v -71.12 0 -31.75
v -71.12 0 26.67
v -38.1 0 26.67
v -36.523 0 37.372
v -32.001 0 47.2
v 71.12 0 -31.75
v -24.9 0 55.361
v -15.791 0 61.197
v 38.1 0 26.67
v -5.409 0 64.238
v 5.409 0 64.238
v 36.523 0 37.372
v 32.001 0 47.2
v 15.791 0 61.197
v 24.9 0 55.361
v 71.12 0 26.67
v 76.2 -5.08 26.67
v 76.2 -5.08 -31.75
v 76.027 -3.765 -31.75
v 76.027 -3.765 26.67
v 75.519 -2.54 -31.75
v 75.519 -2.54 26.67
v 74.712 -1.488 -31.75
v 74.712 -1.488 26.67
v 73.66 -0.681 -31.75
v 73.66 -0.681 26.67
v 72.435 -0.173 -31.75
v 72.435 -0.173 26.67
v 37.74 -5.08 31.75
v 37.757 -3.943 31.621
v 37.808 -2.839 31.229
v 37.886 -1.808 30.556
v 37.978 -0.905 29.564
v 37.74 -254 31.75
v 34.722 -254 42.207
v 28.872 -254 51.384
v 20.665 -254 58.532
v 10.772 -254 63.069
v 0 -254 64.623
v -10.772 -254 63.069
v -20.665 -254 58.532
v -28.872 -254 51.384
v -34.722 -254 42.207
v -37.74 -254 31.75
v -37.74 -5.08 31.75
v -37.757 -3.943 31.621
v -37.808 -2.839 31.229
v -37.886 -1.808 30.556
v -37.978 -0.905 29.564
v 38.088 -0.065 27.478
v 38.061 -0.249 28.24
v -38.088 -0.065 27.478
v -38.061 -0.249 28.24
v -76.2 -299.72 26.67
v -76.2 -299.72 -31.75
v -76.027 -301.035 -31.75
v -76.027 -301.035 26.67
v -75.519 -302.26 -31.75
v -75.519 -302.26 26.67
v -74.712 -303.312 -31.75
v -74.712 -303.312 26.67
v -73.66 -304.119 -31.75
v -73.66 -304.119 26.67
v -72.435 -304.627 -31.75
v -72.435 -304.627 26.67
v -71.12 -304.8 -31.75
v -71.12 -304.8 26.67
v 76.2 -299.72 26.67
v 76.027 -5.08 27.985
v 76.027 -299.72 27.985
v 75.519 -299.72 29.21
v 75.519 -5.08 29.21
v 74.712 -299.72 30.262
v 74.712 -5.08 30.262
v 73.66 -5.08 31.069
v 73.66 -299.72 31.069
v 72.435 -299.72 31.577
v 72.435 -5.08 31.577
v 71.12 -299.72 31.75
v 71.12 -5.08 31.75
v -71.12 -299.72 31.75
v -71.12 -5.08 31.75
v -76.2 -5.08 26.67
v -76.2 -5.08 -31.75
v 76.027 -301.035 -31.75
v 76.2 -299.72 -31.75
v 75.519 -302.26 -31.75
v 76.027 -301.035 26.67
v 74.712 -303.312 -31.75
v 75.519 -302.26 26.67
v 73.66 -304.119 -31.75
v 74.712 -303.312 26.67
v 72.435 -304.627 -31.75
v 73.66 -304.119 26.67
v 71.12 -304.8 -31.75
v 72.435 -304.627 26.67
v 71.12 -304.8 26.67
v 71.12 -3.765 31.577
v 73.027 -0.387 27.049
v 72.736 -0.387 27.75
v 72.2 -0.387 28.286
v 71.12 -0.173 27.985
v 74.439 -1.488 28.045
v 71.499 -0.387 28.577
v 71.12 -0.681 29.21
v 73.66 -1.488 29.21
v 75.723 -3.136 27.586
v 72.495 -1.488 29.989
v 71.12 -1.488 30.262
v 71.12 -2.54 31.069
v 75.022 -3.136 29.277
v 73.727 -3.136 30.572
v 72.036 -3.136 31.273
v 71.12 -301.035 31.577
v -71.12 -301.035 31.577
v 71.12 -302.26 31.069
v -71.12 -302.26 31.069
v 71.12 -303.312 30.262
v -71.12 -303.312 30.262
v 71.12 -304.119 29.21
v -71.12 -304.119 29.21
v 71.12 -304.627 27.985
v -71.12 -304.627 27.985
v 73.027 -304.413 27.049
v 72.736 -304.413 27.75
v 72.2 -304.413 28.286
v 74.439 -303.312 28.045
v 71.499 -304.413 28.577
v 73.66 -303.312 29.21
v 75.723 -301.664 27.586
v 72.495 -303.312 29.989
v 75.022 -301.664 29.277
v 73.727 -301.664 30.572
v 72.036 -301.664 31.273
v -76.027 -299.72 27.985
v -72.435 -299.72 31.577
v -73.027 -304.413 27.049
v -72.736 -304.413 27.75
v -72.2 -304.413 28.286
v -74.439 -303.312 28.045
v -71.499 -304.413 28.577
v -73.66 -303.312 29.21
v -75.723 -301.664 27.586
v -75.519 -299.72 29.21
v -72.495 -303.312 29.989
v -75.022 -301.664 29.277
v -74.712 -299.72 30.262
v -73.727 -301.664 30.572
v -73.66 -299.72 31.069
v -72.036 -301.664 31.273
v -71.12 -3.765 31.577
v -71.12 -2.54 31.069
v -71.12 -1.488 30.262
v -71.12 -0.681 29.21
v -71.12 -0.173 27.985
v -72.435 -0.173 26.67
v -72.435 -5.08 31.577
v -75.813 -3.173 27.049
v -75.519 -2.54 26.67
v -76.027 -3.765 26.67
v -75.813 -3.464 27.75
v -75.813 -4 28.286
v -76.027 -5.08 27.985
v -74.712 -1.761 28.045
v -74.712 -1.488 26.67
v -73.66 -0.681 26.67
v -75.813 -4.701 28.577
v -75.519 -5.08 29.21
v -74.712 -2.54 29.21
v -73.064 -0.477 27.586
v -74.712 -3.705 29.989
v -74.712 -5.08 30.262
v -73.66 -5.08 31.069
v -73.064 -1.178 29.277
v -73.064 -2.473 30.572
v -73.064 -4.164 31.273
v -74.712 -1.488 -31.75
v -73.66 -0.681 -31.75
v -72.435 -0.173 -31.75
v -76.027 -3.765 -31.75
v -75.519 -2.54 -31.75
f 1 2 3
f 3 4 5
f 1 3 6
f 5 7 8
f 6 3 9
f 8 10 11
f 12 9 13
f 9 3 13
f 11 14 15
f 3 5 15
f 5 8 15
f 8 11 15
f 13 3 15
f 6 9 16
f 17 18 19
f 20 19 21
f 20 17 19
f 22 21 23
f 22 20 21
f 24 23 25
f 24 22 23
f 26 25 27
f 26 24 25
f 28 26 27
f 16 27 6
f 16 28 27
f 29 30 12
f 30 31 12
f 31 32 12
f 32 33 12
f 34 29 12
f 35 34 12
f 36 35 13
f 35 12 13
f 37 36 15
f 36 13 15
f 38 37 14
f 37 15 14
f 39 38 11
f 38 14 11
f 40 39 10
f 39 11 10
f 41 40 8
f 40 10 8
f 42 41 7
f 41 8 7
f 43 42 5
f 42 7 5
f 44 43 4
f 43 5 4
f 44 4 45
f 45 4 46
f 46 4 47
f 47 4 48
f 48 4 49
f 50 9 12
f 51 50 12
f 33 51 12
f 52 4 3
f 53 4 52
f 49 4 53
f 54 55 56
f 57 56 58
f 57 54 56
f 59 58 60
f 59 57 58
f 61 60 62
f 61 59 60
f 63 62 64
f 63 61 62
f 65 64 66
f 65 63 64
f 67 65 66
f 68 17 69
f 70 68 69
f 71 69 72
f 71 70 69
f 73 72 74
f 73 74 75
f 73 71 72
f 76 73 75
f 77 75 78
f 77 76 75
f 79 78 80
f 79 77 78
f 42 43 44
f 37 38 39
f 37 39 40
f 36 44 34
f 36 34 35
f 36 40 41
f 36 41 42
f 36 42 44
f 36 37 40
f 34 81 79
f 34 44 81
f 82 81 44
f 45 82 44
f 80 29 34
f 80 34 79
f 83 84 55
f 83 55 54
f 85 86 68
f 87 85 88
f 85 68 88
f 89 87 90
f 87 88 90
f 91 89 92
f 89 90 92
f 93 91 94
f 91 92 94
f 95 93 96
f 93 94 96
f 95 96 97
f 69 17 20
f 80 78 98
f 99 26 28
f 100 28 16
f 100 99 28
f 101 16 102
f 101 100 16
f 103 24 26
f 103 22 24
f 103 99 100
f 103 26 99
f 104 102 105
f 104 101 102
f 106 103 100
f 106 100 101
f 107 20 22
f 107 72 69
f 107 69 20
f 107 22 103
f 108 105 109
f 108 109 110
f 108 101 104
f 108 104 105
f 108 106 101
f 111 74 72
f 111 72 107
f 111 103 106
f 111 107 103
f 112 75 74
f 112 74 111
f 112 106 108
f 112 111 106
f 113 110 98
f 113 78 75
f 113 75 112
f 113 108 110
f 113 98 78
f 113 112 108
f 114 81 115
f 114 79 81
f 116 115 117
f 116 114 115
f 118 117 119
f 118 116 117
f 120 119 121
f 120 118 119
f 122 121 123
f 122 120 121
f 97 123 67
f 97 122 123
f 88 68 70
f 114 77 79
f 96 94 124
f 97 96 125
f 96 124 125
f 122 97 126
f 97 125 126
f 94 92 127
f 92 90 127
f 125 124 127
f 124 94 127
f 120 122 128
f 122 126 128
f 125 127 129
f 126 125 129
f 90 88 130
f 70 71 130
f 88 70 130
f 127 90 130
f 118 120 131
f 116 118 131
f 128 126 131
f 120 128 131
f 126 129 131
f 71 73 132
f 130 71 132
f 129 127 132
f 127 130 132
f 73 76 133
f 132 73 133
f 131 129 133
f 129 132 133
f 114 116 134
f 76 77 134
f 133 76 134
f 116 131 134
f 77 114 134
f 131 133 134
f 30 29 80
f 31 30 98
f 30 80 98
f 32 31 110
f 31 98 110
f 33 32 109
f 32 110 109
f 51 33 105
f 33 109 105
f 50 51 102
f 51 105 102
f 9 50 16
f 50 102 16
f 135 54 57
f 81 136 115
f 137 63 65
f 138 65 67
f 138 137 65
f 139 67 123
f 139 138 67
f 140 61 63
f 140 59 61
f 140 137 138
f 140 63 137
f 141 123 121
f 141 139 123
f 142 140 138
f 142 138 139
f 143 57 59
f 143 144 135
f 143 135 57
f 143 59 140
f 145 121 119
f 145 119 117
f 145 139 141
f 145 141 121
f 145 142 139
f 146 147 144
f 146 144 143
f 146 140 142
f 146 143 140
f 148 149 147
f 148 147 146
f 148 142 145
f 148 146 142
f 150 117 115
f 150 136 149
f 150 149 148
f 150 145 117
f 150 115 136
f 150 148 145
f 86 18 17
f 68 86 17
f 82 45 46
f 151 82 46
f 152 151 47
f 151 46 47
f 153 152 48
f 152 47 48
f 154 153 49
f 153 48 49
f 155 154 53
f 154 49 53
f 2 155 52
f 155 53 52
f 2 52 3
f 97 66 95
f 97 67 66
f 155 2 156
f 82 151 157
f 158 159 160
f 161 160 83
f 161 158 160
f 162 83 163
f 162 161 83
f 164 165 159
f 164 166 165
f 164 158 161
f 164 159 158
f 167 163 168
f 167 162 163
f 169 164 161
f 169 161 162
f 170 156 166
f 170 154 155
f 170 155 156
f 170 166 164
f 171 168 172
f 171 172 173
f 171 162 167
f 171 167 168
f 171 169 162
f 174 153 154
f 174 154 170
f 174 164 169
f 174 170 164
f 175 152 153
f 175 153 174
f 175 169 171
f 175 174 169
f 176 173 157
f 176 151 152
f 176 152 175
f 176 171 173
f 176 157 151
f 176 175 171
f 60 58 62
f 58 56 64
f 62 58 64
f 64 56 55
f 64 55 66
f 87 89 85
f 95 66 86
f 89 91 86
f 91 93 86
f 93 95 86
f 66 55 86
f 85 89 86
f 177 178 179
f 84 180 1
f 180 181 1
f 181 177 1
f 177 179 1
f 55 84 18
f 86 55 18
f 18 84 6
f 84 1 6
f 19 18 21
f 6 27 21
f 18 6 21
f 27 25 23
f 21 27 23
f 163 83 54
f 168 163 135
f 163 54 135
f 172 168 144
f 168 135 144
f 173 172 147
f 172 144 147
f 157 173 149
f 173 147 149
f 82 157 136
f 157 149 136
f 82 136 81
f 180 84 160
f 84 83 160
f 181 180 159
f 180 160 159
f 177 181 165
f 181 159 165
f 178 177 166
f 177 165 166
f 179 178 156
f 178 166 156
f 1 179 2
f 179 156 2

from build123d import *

# Parameters (mm, degrees)
F0_W     = 152.4
F0_H     = 63.5
F1_DEPTH = 304.8
F2_R     = 5.08
F3_R     = 38.1
F4_DEPTH = 254


with BuildPart() as f1:
    # F0 (on Front) → F1 (new body)
    with BuildSketch(Plane.XZ):
        Rectangle(F0_W, F0_H)
    extrude(amount=F1_DEPTH)

    # F2
    f2_edges = [f1.edges().sort_by_distance(p)[0] for p in [
        (76.2, -152.4, 31.75),
        (76.2, -304.8, 0),
        (76.2, 0, 0),
        (0, 0, 31.75),
        (-76.2, 0, 0),
        (-76.2, -152.4, 31.75),
        (-76.2, -304.8, 0),
        (0, -304.8, 31.75),
    ]]
    fillet(f2_edges, radius=F2_R)

    # F3 (on Front) → F4 (join)
    with BuildSketch(Plane.XZ):
        with Locations((0, 26.523461)):
            Circle(F3_R)
    extrude(amount=F4_DEPTH)


solid = f1.part
